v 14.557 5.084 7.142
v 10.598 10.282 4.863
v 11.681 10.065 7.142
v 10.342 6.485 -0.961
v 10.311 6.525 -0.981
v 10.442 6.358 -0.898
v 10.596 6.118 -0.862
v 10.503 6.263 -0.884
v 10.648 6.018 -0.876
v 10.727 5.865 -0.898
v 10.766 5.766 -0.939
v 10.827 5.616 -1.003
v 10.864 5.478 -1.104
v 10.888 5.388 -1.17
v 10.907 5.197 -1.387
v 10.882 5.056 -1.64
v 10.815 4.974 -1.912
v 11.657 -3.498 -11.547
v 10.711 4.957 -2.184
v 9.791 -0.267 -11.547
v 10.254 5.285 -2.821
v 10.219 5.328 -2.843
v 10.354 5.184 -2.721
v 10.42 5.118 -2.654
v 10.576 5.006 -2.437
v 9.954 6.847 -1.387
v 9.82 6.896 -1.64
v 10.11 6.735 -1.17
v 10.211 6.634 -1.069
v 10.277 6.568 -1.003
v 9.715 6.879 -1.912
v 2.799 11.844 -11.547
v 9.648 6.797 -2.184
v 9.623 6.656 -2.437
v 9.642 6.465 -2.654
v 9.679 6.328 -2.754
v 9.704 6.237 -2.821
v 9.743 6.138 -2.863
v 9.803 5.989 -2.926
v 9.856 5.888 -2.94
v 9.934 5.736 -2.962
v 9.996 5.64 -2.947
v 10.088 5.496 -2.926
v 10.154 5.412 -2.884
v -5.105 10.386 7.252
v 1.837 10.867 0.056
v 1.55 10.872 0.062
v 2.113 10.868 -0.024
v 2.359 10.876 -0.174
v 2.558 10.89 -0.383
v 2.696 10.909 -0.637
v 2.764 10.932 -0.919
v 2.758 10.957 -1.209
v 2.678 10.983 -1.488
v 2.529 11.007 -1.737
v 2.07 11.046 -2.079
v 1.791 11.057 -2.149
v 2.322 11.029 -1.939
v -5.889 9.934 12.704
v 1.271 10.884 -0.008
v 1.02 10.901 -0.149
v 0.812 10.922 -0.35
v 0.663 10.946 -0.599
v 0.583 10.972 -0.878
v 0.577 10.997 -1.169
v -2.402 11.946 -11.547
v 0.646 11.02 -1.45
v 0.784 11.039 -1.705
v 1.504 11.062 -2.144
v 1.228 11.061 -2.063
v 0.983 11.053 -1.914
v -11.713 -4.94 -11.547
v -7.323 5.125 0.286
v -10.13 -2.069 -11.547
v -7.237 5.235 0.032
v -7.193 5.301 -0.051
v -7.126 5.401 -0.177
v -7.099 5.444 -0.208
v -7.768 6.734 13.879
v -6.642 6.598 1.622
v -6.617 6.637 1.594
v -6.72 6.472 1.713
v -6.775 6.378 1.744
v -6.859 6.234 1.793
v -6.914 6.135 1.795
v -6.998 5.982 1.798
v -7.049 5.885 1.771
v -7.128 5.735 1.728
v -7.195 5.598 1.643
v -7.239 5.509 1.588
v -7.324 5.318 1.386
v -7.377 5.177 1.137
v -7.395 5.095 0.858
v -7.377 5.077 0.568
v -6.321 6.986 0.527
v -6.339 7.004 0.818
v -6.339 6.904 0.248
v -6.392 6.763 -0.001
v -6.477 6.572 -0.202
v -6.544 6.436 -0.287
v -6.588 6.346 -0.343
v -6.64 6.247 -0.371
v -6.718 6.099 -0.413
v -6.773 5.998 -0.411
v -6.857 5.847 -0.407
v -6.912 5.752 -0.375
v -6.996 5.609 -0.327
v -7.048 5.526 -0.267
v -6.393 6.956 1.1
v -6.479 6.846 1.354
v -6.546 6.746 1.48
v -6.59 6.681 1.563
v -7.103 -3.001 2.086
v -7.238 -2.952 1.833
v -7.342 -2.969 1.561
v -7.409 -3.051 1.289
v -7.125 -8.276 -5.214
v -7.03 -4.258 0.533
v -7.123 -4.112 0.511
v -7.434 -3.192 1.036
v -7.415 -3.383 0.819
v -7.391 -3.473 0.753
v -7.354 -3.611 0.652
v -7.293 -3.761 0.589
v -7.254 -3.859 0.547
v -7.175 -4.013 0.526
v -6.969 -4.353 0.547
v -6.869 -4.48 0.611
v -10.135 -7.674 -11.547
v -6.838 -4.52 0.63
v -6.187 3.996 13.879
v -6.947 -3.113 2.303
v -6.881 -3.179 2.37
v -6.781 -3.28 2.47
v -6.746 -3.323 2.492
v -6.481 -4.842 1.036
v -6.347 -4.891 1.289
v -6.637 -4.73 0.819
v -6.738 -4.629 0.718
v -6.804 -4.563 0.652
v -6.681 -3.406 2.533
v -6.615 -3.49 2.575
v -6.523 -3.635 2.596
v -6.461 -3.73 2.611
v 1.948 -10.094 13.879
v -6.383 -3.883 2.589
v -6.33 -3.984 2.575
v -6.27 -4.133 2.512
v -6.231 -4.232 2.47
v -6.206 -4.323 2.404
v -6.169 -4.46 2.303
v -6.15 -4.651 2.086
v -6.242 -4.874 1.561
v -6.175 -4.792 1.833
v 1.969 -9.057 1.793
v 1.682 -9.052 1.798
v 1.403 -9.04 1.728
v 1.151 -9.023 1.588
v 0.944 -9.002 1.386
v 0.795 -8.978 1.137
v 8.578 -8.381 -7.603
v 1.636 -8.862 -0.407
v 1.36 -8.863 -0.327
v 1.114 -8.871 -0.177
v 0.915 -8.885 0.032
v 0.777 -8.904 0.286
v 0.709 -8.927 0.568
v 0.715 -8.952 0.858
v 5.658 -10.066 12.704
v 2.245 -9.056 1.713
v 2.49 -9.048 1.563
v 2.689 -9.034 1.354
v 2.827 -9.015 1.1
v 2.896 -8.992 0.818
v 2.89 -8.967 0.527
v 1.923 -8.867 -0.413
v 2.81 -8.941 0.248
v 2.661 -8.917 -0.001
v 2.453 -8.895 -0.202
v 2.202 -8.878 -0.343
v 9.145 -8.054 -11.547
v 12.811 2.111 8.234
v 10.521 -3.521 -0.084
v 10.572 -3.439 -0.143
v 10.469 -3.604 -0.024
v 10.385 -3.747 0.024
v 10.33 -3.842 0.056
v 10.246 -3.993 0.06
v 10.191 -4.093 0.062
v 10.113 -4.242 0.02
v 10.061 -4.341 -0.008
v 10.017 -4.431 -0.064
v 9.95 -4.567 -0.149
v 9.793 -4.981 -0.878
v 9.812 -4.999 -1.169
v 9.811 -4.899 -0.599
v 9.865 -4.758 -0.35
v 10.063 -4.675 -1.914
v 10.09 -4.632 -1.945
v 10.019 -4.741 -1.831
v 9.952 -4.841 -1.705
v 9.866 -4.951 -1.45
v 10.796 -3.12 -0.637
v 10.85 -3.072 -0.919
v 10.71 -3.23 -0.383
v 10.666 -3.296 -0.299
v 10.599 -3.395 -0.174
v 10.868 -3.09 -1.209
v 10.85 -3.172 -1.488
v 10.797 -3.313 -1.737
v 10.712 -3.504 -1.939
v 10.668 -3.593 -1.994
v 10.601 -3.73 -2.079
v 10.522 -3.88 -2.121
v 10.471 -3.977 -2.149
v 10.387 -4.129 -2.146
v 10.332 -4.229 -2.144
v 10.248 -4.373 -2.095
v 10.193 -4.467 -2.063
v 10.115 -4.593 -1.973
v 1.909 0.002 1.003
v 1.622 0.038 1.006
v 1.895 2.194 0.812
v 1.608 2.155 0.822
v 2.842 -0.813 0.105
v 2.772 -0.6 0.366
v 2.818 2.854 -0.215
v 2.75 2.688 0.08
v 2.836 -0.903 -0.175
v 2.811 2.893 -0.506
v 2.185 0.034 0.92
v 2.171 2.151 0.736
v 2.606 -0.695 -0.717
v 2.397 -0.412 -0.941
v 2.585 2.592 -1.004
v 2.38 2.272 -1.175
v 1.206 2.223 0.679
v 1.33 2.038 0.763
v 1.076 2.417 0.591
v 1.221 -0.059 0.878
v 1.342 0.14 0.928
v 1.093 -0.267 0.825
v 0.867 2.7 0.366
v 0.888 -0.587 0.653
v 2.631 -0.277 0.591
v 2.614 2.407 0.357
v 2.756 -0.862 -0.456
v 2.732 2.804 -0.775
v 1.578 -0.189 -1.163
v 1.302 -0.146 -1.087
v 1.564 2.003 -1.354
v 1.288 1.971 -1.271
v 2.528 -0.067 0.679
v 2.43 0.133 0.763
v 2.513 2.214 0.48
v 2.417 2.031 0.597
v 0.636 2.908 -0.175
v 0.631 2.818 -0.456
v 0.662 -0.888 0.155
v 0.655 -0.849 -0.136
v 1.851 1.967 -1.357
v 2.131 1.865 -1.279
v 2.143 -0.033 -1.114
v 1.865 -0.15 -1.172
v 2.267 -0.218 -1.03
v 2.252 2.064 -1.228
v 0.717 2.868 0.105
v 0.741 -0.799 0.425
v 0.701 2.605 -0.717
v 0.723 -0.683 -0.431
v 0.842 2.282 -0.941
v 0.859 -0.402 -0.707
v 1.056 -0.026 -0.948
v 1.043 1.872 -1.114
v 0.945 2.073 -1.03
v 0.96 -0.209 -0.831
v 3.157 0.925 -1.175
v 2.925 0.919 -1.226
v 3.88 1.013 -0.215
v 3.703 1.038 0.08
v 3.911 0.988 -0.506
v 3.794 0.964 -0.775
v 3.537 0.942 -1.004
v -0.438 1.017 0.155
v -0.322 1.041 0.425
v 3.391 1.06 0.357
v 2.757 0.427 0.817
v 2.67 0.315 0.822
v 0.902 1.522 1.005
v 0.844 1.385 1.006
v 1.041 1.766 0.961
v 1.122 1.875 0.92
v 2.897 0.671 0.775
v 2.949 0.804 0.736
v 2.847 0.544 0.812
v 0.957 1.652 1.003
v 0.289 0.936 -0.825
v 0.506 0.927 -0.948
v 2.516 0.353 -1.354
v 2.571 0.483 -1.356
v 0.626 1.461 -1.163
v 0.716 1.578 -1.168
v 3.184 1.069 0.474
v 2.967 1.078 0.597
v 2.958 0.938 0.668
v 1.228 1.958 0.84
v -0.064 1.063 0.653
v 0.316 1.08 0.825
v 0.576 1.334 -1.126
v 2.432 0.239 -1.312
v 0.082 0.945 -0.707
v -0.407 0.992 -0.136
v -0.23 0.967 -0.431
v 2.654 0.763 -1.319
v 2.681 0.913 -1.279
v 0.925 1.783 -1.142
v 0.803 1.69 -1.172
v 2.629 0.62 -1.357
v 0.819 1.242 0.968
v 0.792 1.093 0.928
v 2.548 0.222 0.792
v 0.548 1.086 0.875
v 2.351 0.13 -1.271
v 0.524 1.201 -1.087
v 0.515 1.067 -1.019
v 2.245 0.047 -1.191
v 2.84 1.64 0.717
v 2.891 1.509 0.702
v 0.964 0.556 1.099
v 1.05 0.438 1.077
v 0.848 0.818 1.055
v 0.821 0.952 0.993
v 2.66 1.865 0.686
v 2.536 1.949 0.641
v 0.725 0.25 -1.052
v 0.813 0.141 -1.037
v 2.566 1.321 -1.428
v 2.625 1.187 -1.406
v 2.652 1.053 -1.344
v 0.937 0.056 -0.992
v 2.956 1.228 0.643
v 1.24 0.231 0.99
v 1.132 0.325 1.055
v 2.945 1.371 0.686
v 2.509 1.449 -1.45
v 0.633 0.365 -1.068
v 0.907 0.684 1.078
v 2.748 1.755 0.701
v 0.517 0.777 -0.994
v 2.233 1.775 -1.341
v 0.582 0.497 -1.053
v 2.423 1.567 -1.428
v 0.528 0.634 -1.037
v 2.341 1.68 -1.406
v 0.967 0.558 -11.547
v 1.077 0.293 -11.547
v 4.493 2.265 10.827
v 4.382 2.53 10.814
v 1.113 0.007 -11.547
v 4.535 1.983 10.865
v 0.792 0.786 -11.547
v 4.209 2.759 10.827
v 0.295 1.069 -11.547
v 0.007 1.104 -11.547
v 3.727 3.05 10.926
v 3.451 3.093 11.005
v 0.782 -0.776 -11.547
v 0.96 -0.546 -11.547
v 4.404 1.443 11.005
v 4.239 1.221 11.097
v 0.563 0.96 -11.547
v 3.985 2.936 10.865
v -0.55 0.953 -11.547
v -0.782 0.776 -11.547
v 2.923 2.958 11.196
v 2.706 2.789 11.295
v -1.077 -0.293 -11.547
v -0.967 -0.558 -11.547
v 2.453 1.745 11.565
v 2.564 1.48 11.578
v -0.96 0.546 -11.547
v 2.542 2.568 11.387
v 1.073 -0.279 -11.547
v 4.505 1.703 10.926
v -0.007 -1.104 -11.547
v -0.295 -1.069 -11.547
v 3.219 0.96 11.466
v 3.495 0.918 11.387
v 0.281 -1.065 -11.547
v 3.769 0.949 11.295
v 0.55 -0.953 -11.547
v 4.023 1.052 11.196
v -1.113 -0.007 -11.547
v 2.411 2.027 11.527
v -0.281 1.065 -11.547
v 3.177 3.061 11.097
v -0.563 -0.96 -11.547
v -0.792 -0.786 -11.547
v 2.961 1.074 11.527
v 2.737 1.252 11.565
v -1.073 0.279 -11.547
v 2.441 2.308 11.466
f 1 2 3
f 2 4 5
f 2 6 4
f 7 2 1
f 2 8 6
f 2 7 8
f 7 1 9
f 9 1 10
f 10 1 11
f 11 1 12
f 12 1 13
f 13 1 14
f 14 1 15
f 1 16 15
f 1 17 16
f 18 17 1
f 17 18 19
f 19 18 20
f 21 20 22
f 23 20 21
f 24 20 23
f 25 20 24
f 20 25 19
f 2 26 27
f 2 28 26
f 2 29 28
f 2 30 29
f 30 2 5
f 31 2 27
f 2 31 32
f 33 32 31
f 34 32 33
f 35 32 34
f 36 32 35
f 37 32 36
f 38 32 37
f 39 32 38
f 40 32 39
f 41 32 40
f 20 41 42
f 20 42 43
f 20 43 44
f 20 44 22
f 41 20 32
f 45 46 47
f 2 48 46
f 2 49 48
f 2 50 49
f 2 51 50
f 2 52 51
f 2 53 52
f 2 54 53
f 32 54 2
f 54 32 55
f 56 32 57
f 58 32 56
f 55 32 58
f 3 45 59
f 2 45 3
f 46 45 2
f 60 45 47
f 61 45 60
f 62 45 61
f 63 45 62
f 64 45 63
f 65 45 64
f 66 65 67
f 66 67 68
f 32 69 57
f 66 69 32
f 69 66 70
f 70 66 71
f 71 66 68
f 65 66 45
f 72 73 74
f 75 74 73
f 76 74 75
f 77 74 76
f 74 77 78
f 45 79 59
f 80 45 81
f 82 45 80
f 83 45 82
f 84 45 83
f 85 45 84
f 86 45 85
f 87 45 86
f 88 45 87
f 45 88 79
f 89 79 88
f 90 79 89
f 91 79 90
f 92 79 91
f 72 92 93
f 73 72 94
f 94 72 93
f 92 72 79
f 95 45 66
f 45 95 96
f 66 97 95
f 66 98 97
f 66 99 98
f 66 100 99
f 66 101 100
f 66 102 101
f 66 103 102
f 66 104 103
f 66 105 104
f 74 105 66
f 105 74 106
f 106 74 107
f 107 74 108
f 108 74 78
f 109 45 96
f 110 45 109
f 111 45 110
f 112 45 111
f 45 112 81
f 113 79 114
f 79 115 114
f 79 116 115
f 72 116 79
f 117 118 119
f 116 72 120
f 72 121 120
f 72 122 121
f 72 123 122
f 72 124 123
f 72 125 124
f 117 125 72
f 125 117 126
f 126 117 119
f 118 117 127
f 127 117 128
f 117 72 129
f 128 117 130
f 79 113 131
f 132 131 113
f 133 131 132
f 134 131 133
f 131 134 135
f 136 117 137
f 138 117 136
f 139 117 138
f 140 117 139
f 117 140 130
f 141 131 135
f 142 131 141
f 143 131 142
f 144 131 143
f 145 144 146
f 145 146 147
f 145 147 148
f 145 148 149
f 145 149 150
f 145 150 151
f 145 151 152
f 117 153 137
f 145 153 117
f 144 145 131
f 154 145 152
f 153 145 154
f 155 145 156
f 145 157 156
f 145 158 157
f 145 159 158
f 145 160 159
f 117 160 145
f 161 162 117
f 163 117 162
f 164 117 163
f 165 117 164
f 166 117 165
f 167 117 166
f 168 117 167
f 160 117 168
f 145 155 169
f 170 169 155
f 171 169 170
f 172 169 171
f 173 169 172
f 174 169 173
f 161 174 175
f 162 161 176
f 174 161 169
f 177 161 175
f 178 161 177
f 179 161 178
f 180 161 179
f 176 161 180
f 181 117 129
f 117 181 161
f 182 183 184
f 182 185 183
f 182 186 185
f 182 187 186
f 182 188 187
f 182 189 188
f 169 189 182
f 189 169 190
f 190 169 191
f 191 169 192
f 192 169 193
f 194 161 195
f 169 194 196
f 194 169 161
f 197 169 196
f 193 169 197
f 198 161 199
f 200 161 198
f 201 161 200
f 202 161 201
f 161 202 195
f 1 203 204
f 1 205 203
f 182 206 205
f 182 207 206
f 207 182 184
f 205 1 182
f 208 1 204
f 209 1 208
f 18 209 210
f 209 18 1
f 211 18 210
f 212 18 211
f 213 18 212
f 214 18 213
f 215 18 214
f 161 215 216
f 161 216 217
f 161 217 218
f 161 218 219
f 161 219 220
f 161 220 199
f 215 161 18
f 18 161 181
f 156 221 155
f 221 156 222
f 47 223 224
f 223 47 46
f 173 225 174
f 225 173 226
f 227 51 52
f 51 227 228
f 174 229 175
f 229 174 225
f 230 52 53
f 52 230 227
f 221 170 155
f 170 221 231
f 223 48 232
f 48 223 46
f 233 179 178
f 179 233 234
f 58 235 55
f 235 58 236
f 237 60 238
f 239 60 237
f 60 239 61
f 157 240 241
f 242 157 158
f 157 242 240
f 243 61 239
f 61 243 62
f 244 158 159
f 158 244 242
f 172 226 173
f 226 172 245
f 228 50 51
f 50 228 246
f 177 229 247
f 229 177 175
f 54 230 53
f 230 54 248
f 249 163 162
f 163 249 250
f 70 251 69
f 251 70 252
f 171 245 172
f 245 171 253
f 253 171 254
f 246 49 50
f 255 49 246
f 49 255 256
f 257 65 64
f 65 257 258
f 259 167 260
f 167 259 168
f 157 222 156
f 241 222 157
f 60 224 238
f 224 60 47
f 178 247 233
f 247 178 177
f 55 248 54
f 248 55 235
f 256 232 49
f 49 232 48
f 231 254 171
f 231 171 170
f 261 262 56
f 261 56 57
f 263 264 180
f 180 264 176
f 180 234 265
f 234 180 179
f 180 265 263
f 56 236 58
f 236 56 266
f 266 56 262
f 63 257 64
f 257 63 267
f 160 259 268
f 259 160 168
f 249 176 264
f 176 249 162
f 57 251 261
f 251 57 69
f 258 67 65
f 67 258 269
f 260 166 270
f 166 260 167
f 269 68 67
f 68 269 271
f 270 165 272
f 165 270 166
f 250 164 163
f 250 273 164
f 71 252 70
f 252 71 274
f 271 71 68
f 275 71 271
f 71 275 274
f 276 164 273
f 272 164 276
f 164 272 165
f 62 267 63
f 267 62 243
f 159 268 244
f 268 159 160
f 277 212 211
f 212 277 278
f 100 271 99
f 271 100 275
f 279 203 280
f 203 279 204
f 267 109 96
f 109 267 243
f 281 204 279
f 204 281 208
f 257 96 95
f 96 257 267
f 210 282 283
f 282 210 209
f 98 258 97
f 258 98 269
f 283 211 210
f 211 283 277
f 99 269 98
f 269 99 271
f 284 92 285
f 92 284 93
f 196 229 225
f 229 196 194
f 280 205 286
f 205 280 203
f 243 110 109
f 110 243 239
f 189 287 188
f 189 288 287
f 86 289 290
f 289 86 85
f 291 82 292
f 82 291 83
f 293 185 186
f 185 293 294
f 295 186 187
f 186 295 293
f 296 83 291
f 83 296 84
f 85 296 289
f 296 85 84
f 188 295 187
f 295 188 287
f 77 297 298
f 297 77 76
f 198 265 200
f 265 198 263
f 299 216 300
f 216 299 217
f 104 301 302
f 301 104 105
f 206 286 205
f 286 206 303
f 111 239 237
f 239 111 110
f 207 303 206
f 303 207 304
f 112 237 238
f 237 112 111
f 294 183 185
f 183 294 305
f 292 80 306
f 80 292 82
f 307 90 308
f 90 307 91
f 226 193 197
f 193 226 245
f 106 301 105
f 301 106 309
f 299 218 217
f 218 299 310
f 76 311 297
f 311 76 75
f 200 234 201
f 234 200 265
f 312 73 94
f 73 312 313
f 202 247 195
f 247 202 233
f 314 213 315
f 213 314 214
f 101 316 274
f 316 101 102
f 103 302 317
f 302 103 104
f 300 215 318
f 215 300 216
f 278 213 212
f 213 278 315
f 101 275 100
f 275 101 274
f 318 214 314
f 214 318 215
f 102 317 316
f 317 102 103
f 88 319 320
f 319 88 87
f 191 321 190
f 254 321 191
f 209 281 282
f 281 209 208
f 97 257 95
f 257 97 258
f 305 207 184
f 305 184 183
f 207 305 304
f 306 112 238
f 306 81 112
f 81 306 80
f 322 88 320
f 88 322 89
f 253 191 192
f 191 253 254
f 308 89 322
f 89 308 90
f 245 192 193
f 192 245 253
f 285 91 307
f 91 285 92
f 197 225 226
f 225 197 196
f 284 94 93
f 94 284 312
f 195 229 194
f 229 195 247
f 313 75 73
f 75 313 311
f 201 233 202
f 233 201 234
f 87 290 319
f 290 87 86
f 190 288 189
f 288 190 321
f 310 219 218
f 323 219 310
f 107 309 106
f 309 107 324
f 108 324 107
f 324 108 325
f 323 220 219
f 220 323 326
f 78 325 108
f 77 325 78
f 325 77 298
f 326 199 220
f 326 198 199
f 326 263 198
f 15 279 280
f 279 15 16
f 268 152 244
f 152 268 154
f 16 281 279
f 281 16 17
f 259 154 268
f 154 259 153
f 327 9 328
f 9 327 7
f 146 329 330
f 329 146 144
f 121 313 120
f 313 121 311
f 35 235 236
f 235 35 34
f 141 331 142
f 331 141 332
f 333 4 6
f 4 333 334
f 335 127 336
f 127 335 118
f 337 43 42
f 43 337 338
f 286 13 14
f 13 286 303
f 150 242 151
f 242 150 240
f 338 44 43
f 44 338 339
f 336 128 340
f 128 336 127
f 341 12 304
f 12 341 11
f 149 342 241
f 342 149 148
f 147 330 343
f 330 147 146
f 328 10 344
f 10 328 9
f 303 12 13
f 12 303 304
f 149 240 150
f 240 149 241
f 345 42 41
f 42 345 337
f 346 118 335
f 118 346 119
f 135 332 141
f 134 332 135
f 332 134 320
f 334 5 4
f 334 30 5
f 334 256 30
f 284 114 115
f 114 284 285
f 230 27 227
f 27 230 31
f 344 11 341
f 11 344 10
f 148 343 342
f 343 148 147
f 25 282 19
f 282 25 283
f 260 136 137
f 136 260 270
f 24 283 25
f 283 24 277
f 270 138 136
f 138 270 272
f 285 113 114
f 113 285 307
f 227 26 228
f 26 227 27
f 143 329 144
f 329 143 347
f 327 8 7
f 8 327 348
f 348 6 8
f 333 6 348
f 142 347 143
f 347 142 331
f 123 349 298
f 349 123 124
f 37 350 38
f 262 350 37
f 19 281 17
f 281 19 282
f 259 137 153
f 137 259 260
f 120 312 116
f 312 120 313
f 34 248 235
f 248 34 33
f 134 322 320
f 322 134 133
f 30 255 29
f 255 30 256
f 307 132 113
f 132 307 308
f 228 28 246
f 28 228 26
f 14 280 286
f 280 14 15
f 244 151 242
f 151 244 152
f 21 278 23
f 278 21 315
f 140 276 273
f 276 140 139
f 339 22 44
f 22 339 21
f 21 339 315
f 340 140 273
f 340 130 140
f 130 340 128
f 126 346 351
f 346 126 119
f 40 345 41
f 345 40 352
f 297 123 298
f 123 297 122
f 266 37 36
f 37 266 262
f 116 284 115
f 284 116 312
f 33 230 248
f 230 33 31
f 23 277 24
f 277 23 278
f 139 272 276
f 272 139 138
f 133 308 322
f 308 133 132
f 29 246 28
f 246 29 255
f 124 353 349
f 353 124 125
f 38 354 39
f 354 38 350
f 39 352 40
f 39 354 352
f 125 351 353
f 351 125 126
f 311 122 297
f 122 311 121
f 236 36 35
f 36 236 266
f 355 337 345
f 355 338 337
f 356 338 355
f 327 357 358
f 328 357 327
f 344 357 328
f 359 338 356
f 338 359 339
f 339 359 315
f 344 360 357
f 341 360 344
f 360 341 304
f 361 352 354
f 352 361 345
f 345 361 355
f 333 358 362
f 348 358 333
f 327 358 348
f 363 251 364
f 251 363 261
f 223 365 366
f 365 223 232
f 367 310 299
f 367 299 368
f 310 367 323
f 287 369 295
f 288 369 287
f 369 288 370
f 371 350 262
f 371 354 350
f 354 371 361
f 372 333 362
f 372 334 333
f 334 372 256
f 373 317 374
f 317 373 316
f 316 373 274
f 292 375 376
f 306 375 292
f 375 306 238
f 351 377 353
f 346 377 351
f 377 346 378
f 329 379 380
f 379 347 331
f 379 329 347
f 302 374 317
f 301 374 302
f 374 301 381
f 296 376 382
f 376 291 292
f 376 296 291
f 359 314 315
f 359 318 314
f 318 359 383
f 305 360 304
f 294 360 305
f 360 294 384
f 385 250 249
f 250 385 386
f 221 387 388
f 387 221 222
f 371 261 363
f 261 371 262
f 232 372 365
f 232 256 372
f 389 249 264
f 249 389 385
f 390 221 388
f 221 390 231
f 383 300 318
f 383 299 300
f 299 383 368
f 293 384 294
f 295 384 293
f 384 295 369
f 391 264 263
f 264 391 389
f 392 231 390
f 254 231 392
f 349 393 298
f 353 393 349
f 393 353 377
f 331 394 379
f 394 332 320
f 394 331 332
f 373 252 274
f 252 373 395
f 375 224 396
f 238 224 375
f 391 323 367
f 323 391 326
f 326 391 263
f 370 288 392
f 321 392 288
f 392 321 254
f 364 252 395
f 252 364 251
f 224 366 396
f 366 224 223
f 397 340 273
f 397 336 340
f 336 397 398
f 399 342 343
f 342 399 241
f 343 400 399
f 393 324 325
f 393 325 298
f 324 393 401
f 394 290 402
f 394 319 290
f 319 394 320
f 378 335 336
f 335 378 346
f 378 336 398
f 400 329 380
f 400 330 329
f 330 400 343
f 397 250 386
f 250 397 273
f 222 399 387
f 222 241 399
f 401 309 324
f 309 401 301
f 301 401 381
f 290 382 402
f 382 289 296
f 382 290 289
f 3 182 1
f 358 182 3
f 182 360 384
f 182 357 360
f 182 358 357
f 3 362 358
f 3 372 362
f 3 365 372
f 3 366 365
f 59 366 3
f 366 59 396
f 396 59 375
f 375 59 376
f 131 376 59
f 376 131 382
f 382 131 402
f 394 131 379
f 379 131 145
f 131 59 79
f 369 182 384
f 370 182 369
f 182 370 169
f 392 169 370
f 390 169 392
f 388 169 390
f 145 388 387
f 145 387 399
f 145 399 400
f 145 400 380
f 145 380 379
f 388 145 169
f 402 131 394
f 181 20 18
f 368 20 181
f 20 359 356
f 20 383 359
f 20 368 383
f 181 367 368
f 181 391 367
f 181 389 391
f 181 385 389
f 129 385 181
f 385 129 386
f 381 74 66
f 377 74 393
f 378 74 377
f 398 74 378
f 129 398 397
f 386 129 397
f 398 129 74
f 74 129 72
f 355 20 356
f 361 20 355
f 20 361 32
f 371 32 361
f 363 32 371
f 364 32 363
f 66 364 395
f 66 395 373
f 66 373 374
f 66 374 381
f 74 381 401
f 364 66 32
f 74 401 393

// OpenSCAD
//Шаг сетки для решётки из усечённых октаэдров (межцентровое расстояние)
MM_GRID_HEX_STEP = 20; //тогда сторона шестиугольника = MM_GRID_HEX_STEP / КОРЕНЬ(3)
MM_GRIG_TOP_STEP_ON_Y_COORDINATE = MM_GRID_HEX_STEP / sqrt(3) * 2;

//диаметр отвертия (диаметр описанной окружности около многоугольника детализации)
//если диаметр = 0, то отверстий нет, 2.2 = диаметр зубочистки
MM_HOLE_DIAMETER = 2.2;

//true либо false параметр, показывающия исходный ромбододекаэдр без скоса
//для подсветки и разработки делай true, для 3Д-печати делай false
WILL_SHOW_CORE = false;
//показывать цвета
WILL_SHOW_COLOR = true;
//надо ли класть фигуру на шестиугольную грань?
WILL_PUT_ON_FACE = true;

//ДАЛЬШЕ НИЧЕГО НЕ МЕНЯТЬ, НЕ ПРОКОНСУЛЬТИРОВАВШИСЬ 
//С Полозковым Серегеем Сергеевичем
//такой n-угольник для детализации отверстия
HOLE_DETALISATION_IS_N_POLYGON = 24;
//грани, которы надо показывать
ARR_SHOW_FACES = [0,1,2,3,4,5];
BIG = (MM_GRID_HEX_STEP + MM_GRIG_TOP_STEP_ON_Y_COORDINATE) * 10;

//как срезаем боковые грани призмы (0.5 - ось по средней линии)
C_CUT_RATIO = 0.5;
//меняем знаки углов наклонов
SIGNES_DEGREE = [1, -1, 1, -1, 1, -1];
//срезаем боковые грани призмы на этот угол
C_CUT_DEGREE = 10;

//срезаем шетиугольны грани призмы на этот угол (верхнюю и нижнюю)
C_HEX_CUT_DEGREE = 10;
//ecли знаки разные, то срезаем параллельноб; если одинаковые, то сходятся 
SIGNES_HEX_DEGREE = [1, 1]; 
//поворот по вертикальной плоскости (от 0 до 360) отси наклона
C_HEX_CUT_DEGREE_Z_ROTATE = 30;

//пирамида по всем вершинам, точка номер ноль - апексная вершина
module m_pyramid(apex_and_base) {
    p3 = [[0,1,2],[0,2,3],[0,3,1],[3,2,1]];
    p4 = [[0,1,2],[0,2,3],[0,3,4],[0,4,1],[4,3,2,1]];
    p5 = [[0,1,2],[0,2,3],[0,3,4],[0,4,5],[0,5,1],[5,4,3,2,1]];
    p6 = [[0,1,2],[0,2,3],[0,3,4],[0,4,1],[0,5,6],[0,6,1],[6,5,4,3,2,1]];
    faces_arr = [p3,p4,p5,p6];
    faces_indexes = faces_arr[len(apex_and_base) - 4];
    polyhedron(points=apex_and_base, faces=faces_indexes);
}

//интерполирование по прямой с точками р0(ноль) и р1(один) любым вещественным числом
//массивы (три координаты) тоже можно складывать и умножать на число
function f_n01(p0, p1, n01) = ((p1 - p0) * n01) + p0;

function f_sum_3(p) = p[0] + p[1] + p[2];
function f_sum_4(p) = f_sum_3(p) + p[3];
function f_sum_6(p) = f_sum_4(p) + p[4] + p[5];
function f_sum(p) = let (L=len(p)) (L == 6) ? f_sum_6(p) : (L == 4) ? f_sum_4(p) : f_sum_3(p);

//центр массива точек
function f_center(array_p) = f_sum(array_p) * (1 / len(array_p));

//синтаксис для переменных (в том числе, функциональных переменных)
//my_scale - во сколько раз раздувать (масштабировать)
function f_polygon_extend(any_polygon, my_scale) =
    //центр тяжести треугольника или четырёх точек
    let (c = f_center(any_polygon))
    //функцция раздувания трёх или четырёх точек с сохранением чентра тяжести
    let (f = function (i) f_n01(c, any_polygon[i % len(any_polygon)], my_scale))
    let (p3 = [f(0), f(1), f(2)])
    let (p4 = [f(0), f(1), f(2), f(3)])
    let (p5 = [f(0), f(1), f(2), f(3), f(4)])
    let (p6 = [f(0), f(1), f(2), f(3), f(4), f(5)])
    let (p_any = [p3, p4, p5, p6])
p_any[len(any_polygon) - 3];

//координаты вершин призмы
S60 = sin(60);
function f60(i, h_sign = 1) = let (ratio_hex = MM_GRID_HEX_STEP / sqrt(3))
    [cos(i*60) * ratio_hex, sin(i*60) * ratio_hex, h_sign * MM_GRIG_TOP_STEP_ON_Y_COORDINATE / 2]; 
function f6(i) = [f60(i), f60(i,-1), f60(i+1,-1),f60(i+1)];
face_6 = [f60(0),f60(1),f60(2), f60(3),f60(4),f60(5)];
face_7 = [f60(0,-1),f60(1,-1), f60(2,-1),f60(3,-1),f60(4,-1),f60(5,-1)];
face_all = [f6(0), f6(1), f6(2), f6(3), f6(4), f6(5), face_6, face_7];

function f_face_iALL(i) = face_all[i];

//полупространство как треугольная или четырёхугольная пирамида
//берём основание и строим пирамиду с вершиной в нуле
//раздуваем основание; если scale_pyramid_ratio = 1, то сохраняем пропорции
//если scale_pyramid_ratio = 2, то вытягиваем пирамиду по высоте в два раза
function f_half_space(old_base, scale_base, scale_pyramid_ratio) =
    //раздутое основание
    let (new_base = f_polygon_extend(old_base, scale_base))
    //вершина пирамиды
    let (p_apex = f_n01(f_center(old_base), [0,0,0], scale_base * scale_pyramid_ratio))
concat([p_apex], new_base);



module m_face(i_face, scale_triangle, scale_pyramid_ratio) {
    p_base_polygon = f_face_iALL(i_face);
    m_pyramid(f_half_space(p_base_polygon, scale_triangle, scale_pyramid_ratio));
}

function f_axis(p4, my_ratio) = [f_n01(p4[0], p4[1], my_ratio), f_n01(p4[2], p4[3], my_ratio)];


module m_my_rotation_on_ab_and_degree(ab, degree) {
    translate(ab[1])
        rotate(a = degree, v = ab[1] - ab[0])
            translate(ab[1] * (-1))
                children();
}

module m_my_rotation_on_axis(i_face, cut_ratio, cut_degree, sign_rotation = 1) {
    ab = f_axis(f_face_iALL(i_face), cut_ratio);
    m_my_rotation_on_ab_and_degree(ab, cut_degree * sign_rotation)
        children();
}

module m_rotated_face(i_face, cut_ratio, cut_degree) {
    m_my_rotation_on_axis(i_face, cut_ratio, cut_degree * SIGNES_DEGREE[i_face])
        m_face(i_face, 8, 1);
}

ARR_COLORS = 
["Red","Orange","Yellow","Green","Cyan","Blue", "White", "Black"];


module m_ALL_faces(will_show_not_rotated_core, cut_ratio, cut_degree) {
    intersection_for(n = ARR_SHOW_FACES){
        if (WILL_SHOW_COLOR) {
            color(ARR_COLORS[n]) 
                hull() m_rotated_face(n, cut_ratio, cut_degree);
        }
        else 
            hull() m_rotated_face(n, cutratio, cut_degree);
    }
    
    if (will_show_not_rotated_core)
        #for(tn = ARR_SHOW_FACES) {
            m_face(tn, 1, 1);
    }
}

module m_x_cylinder(a_z = 0, d=MM_HOLE_DIAMETER, half_h=(max(MM_GRIG_TOP_STEP_ON_Y_COORDINATE, MM_GRID_HEX_STEP) * 0.5) * 4.2) {
    rotate (a_z)
        rotate ([90,0,0])
            cylinder(h=half_h*2, d=d, center=true, $fn=HOLE_DETALISATION_IS_N_POLYGON);
}

module m_all_cylinders() {
    if (MM_HOLE_DIAMETER > 0) {
        m_x_cylinder();
        m_x_cylinder(60);
        m_x_cylinder(-60);
        rotate ([-90,0,0])
            m_x_cylinder();
    }
}

module m_top_bottom_cover(half_h) {
    p4 = [[0,0,-BIG], [BIG,BIG,half_h], [BIG,-BIG,half_h], [-BIG,-BIG,half_h], [-BIG,BIG,half_h]];
    hull()
        m_pyramid(p4);
}
module m_top_bottom(half_h, degree_on_z, degree_cut, is_reflex) {
    ab = [[0,0,half_h], [0,1,half_h]];
    rotate (degree_on_z)
        mirror(is_reflex ? [0,0,1] : [0,1,0]) 
            m_my_rotation_on_ab_and_degree(ab, degree_cut)
                m_top_bottom_cover(half_h);
}

module m_difference_for_holes(show_core = WILL_SHOW_CORE, cut_ratio = C_CUT_RATIO, cut_degree = C_CUT_DEGREE) { 
    half_h = MM_GRIG_TOP_STEP_ON_Y_COORDINATE / 2;
    ab_bottom = [[0,0,-half_h], [cos(C_HEX_CUT_DEGREE_Z_ROTATE + 90), sin(C_HEX_CUT_DEGREE_Z_ROTATE + 90),-half_h]];
    
    m_my_rotation_on_ab_and_degree(ab_bottom, C_HEX_CUT_DEGREE * SIGNES_HEX_DEGREE[1] * (WILL_PUT_ON_FACE ? 1 : 0))
    intersection () {
        color (ARR_COLORS[6])
            m_top_bottom(half_h, C_HEX_CUT_DEGREE_Z_ROTATE, C_HEX_CUT_DEGREE * SIGNES_HEX_DEGREE[0], false);
        color (ARR_COLORS[7]) //черная грань с отражением, поэтому внизу плоскость сечения
            m_top_bottom(half_h, C_HEX_CUT_DEGREE_Z_ROTATE, C_HEX_CUT_DEGREE * SIGNES_HEX_DEGREE[1], true);
        difference () {       
            m_ALL_faces(show_core, cut_ratio, cut_degree);
            m_all_cylinders();   
        }
    }
}

m_difference_for_holes(WILL_SHOW_CORE, C_CUT_RATIO, C_CUT_DEGREE);
